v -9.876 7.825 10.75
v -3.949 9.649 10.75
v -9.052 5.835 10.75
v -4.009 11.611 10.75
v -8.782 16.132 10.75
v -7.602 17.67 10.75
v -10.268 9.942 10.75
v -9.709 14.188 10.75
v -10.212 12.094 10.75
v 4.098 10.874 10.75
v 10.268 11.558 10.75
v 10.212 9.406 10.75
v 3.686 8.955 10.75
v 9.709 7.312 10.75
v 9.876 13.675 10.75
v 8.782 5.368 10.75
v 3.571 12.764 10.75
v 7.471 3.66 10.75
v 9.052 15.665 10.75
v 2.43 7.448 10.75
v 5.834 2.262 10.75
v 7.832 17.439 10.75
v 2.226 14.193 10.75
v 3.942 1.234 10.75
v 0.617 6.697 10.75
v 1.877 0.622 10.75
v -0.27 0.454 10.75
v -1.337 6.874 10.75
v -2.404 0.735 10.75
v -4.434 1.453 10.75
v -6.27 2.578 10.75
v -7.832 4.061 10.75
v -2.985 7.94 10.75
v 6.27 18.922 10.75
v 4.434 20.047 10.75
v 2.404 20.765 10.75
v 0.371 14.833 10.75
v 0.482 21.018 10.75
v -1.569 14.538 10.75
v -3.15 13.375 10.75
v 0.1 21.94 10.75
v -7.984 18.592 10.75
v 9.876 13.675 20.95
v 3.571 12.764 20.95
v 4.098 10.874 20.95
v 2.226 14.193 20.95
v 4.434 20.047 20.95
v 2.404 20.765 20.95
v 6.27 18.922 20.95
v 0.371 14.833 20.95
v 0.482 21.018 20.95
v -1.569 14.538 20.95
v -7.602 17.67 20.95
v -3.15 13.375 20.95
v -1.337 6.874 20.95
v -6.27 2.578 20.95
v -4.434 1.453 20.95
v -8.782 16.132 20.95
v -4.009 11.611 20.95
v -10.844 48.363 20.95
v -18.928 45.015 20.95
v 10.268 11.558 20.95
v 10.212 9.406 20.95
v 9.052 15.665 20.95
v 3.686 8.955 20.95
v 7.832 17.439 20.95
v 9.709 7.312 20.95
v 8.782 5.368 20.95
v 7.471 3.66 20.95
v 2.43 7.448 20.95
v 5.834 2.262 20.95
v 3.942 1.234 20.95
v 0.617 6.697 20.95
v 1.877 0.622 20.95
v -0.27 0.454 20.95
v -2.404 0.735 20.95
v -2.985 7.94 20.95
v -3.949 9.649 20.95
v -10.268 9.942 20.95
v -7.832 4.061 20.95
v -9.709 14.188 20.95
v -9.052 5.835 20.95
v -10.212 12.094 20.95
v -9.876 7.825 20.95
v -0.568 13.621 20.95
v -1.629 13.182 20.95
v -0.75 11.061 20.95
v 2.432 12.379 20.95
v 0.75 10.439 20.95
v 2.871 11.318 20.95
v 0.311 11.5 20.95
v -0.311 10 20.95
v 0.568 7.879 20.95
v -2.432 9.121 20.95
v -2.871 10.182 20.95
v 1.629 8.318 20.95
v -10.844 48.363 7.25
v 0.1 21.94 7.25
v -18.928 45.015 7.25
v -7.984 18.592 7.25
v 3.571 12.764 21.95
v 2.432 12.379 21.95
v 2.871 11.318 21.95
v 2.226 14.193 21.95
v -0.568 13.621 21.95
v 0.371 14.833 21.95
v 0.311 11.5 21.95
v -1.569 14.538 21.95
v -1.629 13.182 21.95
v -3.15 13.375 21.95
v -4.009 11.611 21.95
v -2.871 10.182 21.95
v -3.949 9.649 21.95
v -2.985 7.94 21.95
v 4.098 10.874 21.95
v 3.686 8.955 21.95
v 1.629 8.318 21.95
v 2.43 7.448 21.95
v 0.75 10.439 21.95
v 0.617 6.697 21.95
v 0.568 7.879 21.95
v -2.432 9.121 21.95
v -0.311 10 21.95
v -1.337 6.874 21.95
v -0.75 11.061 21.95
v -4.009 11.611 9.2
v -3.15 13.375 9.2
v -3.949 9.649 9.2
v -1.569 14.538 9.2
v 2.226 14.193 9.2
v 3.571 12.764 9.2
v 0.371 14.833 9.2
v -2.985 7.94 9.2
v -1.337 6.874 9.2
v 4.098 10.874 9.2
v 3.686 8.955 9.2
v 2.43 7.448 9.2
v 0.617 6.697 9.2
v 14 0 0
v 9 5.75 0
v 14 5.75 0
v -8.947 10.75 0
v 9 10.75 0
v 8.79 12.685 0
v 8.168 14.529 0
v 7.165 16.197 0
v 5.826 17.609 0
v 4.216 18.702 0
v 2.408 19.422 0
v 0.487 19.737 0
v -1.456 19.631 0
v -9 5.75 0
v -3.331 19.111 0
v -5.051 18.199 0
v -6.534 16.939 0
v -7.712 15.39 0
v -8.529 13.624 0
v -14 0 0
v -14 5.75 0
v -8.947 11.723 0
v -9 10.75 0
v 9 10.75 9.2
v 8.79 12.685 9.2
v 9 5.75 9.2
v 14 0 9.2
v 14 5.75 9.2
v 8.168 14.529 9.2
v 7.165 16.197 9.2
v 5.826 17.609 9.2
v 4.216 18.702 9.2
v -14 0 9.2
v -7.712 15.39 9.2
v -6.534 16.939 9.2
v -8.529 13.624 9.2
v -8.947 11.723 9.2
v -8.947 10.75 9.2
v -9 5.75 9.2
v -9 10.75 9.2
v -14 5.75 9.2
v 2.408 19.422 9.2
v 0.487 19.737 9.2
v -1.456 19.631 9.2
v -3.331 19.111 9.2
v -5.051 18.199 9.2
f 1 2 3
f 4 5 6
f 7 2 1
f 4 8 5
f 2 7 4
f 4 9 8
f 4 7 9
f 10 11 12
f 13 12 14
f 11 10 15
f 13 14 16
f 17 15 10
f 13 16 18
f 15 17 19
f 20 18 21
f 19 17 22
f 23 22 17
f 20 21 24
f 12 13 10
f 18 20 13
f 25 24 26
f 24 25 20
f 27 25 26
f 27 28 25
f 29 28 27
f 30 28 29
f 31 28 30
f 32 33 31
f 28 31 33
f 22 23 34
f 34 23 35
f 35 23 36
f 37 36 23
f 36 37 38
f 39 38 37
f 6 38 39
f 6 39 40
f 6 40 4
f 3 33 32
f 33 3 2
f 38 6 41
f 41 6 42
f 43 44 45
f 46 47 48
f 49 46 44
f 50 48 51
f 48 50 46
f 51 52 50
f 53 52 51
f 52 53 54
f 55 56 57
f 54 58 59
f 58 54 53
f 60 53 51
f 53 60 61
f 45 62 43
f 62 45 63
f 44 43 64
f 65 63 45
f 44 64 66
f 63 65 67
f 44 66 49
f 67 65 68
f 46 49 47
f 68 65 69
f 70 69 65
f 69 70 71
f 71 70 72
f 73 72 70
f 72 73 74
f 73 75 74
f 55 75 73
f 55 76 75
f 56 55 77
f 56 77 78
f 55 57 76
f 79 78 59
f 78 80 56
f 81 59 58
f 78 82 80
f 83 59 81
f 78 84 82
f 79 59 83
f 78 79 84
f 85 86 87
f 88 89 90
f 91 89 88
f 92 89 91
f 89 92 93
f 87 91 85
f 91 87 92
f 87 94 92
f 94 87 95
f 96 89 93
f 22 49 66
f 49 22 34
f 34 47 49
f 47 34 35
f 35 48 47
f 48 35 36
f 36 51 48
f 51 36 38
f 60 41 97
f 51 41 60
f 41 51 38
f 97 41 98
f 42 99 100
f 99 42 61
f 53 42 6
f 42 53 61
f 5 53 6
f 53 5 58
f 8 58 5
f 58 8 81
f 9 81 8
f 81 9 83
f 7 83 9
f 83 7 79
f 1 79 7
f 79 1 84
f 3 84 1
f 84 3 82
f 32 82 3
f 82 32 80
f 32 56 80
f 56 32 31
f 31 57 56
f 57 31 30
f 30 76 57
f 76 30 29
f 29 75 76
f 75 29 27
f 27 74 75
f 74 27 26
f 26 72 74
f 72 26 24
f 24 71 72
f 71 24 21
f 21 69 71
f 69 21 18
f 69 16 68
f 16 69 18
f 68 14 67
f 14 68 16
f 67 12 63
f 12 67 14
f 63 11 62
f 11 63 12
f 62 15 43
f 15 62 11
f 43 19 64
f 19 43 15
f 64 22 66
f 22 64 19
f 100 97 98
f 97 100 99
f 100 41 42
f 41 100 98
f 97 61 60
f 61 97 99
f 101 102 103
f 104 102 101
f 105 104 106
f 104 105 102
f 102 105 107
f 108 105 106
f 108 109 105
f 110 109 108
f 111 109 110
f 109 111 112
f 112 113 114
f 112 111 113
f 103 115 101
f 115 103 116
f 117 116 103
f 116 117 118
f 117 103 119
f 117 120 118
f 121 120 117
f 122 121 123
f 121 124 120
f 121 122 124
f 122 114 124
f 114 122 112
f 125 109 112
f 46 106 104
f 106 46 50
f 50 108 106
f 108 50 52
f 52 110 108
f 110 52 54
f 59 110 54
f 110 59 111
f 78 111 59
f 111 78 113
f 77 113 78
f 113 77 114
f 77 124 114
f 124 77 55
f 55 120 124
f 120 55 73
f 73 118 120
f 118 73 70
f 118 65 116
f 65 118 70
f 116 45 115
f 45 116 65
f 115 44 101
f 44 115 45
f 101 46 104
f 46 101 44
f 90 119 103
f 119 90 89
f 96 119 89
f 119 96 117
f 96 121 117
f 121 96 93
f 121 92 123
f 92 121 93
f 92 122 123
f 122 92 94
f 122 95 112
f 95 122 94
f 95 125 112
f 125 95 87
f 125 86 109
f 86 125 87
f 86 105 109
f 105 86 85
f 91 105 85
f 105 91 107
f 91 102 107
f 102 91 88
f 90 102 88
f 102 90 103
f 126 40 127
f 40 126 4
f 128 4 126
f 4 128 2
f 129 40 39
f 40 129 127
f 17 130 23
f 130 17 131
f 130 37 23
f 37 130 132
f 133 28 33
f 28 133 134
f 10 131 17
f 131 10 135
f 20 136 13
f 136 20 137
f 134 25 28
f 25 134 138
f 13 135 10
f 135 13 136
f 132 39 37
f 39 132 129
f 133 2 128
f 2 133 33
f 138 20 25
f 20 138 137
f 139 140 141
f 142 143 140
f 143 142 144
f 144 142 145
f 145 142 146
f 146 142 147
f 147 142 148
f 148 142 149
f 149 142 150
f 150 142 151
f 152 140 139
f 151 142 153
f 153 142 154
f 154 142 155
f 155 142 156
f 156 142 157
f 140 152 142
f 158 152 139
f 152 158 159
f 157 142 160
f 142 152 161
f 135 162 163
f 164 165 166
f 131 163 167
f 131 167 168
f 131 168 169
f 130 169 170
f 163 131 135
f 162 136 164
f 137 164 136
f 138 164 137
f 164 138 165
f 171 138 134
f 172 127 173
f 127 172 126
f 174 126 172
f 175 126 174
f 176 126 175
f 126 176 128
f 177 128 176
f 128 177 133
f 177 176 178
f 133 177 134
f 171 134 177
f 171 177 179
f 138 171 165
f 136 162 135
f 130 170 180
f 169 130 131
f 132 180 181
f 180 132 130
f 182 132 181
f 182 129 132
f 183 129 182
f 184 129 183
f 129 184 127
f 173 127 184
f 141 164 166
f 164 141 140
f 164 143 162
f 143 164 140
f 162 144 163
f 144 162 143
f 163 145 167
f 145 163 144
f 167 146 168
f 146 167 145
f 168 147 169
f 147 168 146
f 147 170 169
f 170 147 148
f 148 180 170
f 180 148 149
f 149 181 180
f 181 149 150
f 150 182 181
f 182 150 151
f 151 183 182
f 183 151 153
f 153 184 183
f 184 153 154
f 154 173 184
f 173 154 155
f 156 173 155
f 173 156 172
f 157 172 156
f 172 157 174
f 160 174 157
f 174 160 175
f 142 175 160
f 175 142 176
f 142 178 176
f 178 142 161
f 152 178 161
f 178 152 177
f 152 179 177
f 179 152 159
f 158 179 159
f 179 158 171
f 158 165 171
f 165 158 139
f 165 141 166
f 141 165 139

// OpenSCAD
include <ieq30pro_dimensions.scad>

clutch(abs(($t*90)-45)+90*0.75);

module clutch(handle_angle=0) {
  r = clutch_base_diameter/2;
  raise_by = clutch_base_height - r;
  translate([0,raise_by,0]) {
    // Extrusion out of the base
    color(cast_iron_color)
      clutch_base();

    // Handle, shaft and screw.
    translate([0,0,clutch_screw_length])
      rotate([0, 0, handle_angle])
        clutch_handle();
  };
};

module clutch_base() {
  linear_extrude(height=clutch_extrusion)
    union() {
      r = clutch_base_diameter/2;
      circle(r=r);

      w1 = clutch_flange_width;
      h1 = clutch_flange_height;
      w2 = clutch_base_diameter;
      h2 = clutch_base_height - r;

      translate([-w1/2, -h2, 0])
        square([w1,h1]);

      translate([-w2/2, -h2, 0])
        square([w2,h2]);
    };
};

module clutch_handle() {
  color(plastic_color) {
    radius = clutch_handle_base_diam / 2;
    hw = clutch_handle_width / 2;
    linear_extrude(height=clutch_handle_depth1)
      union() {
        circle(r=radius);
        translate([0,-hw])
          square([clutch_handle_length,
                  clutch_handle_width]);
      };

    len2 = clutch_handle_length - radius;
    drop = clutch_handle_depth2-clutch_handle_depth1;
    translate([0,0,-drop])
      linear_extrude(height=clutch_handle_depth2)
        translate([radius,-hw])
          square([len2, clutch_handle_width]);
  };
  
  // The screw head, mostly for decoration.
  color("silver") {
    r = clutch_screw_head_diam/2;
    w = r * 1.4;
    h = w/5;
    translate([0,0,clutch_handle_depth1])
      linear_extrude(height=1)
        difference() {
          circle(r=r);
          square([w,h], center=true);
          square([h,w], center=true);
        }
  };

  // The shaft that is rotated by the handle,
  // of which a little is visible between the
  // handle and the body of the axis.
  color("gold") {
    r = clutch_screw_head_diam/2;
    h = 10;
    translate([0,0, -(h-1)])
      linear_extrude(height=h)
        circle(r=r);
  }
};
